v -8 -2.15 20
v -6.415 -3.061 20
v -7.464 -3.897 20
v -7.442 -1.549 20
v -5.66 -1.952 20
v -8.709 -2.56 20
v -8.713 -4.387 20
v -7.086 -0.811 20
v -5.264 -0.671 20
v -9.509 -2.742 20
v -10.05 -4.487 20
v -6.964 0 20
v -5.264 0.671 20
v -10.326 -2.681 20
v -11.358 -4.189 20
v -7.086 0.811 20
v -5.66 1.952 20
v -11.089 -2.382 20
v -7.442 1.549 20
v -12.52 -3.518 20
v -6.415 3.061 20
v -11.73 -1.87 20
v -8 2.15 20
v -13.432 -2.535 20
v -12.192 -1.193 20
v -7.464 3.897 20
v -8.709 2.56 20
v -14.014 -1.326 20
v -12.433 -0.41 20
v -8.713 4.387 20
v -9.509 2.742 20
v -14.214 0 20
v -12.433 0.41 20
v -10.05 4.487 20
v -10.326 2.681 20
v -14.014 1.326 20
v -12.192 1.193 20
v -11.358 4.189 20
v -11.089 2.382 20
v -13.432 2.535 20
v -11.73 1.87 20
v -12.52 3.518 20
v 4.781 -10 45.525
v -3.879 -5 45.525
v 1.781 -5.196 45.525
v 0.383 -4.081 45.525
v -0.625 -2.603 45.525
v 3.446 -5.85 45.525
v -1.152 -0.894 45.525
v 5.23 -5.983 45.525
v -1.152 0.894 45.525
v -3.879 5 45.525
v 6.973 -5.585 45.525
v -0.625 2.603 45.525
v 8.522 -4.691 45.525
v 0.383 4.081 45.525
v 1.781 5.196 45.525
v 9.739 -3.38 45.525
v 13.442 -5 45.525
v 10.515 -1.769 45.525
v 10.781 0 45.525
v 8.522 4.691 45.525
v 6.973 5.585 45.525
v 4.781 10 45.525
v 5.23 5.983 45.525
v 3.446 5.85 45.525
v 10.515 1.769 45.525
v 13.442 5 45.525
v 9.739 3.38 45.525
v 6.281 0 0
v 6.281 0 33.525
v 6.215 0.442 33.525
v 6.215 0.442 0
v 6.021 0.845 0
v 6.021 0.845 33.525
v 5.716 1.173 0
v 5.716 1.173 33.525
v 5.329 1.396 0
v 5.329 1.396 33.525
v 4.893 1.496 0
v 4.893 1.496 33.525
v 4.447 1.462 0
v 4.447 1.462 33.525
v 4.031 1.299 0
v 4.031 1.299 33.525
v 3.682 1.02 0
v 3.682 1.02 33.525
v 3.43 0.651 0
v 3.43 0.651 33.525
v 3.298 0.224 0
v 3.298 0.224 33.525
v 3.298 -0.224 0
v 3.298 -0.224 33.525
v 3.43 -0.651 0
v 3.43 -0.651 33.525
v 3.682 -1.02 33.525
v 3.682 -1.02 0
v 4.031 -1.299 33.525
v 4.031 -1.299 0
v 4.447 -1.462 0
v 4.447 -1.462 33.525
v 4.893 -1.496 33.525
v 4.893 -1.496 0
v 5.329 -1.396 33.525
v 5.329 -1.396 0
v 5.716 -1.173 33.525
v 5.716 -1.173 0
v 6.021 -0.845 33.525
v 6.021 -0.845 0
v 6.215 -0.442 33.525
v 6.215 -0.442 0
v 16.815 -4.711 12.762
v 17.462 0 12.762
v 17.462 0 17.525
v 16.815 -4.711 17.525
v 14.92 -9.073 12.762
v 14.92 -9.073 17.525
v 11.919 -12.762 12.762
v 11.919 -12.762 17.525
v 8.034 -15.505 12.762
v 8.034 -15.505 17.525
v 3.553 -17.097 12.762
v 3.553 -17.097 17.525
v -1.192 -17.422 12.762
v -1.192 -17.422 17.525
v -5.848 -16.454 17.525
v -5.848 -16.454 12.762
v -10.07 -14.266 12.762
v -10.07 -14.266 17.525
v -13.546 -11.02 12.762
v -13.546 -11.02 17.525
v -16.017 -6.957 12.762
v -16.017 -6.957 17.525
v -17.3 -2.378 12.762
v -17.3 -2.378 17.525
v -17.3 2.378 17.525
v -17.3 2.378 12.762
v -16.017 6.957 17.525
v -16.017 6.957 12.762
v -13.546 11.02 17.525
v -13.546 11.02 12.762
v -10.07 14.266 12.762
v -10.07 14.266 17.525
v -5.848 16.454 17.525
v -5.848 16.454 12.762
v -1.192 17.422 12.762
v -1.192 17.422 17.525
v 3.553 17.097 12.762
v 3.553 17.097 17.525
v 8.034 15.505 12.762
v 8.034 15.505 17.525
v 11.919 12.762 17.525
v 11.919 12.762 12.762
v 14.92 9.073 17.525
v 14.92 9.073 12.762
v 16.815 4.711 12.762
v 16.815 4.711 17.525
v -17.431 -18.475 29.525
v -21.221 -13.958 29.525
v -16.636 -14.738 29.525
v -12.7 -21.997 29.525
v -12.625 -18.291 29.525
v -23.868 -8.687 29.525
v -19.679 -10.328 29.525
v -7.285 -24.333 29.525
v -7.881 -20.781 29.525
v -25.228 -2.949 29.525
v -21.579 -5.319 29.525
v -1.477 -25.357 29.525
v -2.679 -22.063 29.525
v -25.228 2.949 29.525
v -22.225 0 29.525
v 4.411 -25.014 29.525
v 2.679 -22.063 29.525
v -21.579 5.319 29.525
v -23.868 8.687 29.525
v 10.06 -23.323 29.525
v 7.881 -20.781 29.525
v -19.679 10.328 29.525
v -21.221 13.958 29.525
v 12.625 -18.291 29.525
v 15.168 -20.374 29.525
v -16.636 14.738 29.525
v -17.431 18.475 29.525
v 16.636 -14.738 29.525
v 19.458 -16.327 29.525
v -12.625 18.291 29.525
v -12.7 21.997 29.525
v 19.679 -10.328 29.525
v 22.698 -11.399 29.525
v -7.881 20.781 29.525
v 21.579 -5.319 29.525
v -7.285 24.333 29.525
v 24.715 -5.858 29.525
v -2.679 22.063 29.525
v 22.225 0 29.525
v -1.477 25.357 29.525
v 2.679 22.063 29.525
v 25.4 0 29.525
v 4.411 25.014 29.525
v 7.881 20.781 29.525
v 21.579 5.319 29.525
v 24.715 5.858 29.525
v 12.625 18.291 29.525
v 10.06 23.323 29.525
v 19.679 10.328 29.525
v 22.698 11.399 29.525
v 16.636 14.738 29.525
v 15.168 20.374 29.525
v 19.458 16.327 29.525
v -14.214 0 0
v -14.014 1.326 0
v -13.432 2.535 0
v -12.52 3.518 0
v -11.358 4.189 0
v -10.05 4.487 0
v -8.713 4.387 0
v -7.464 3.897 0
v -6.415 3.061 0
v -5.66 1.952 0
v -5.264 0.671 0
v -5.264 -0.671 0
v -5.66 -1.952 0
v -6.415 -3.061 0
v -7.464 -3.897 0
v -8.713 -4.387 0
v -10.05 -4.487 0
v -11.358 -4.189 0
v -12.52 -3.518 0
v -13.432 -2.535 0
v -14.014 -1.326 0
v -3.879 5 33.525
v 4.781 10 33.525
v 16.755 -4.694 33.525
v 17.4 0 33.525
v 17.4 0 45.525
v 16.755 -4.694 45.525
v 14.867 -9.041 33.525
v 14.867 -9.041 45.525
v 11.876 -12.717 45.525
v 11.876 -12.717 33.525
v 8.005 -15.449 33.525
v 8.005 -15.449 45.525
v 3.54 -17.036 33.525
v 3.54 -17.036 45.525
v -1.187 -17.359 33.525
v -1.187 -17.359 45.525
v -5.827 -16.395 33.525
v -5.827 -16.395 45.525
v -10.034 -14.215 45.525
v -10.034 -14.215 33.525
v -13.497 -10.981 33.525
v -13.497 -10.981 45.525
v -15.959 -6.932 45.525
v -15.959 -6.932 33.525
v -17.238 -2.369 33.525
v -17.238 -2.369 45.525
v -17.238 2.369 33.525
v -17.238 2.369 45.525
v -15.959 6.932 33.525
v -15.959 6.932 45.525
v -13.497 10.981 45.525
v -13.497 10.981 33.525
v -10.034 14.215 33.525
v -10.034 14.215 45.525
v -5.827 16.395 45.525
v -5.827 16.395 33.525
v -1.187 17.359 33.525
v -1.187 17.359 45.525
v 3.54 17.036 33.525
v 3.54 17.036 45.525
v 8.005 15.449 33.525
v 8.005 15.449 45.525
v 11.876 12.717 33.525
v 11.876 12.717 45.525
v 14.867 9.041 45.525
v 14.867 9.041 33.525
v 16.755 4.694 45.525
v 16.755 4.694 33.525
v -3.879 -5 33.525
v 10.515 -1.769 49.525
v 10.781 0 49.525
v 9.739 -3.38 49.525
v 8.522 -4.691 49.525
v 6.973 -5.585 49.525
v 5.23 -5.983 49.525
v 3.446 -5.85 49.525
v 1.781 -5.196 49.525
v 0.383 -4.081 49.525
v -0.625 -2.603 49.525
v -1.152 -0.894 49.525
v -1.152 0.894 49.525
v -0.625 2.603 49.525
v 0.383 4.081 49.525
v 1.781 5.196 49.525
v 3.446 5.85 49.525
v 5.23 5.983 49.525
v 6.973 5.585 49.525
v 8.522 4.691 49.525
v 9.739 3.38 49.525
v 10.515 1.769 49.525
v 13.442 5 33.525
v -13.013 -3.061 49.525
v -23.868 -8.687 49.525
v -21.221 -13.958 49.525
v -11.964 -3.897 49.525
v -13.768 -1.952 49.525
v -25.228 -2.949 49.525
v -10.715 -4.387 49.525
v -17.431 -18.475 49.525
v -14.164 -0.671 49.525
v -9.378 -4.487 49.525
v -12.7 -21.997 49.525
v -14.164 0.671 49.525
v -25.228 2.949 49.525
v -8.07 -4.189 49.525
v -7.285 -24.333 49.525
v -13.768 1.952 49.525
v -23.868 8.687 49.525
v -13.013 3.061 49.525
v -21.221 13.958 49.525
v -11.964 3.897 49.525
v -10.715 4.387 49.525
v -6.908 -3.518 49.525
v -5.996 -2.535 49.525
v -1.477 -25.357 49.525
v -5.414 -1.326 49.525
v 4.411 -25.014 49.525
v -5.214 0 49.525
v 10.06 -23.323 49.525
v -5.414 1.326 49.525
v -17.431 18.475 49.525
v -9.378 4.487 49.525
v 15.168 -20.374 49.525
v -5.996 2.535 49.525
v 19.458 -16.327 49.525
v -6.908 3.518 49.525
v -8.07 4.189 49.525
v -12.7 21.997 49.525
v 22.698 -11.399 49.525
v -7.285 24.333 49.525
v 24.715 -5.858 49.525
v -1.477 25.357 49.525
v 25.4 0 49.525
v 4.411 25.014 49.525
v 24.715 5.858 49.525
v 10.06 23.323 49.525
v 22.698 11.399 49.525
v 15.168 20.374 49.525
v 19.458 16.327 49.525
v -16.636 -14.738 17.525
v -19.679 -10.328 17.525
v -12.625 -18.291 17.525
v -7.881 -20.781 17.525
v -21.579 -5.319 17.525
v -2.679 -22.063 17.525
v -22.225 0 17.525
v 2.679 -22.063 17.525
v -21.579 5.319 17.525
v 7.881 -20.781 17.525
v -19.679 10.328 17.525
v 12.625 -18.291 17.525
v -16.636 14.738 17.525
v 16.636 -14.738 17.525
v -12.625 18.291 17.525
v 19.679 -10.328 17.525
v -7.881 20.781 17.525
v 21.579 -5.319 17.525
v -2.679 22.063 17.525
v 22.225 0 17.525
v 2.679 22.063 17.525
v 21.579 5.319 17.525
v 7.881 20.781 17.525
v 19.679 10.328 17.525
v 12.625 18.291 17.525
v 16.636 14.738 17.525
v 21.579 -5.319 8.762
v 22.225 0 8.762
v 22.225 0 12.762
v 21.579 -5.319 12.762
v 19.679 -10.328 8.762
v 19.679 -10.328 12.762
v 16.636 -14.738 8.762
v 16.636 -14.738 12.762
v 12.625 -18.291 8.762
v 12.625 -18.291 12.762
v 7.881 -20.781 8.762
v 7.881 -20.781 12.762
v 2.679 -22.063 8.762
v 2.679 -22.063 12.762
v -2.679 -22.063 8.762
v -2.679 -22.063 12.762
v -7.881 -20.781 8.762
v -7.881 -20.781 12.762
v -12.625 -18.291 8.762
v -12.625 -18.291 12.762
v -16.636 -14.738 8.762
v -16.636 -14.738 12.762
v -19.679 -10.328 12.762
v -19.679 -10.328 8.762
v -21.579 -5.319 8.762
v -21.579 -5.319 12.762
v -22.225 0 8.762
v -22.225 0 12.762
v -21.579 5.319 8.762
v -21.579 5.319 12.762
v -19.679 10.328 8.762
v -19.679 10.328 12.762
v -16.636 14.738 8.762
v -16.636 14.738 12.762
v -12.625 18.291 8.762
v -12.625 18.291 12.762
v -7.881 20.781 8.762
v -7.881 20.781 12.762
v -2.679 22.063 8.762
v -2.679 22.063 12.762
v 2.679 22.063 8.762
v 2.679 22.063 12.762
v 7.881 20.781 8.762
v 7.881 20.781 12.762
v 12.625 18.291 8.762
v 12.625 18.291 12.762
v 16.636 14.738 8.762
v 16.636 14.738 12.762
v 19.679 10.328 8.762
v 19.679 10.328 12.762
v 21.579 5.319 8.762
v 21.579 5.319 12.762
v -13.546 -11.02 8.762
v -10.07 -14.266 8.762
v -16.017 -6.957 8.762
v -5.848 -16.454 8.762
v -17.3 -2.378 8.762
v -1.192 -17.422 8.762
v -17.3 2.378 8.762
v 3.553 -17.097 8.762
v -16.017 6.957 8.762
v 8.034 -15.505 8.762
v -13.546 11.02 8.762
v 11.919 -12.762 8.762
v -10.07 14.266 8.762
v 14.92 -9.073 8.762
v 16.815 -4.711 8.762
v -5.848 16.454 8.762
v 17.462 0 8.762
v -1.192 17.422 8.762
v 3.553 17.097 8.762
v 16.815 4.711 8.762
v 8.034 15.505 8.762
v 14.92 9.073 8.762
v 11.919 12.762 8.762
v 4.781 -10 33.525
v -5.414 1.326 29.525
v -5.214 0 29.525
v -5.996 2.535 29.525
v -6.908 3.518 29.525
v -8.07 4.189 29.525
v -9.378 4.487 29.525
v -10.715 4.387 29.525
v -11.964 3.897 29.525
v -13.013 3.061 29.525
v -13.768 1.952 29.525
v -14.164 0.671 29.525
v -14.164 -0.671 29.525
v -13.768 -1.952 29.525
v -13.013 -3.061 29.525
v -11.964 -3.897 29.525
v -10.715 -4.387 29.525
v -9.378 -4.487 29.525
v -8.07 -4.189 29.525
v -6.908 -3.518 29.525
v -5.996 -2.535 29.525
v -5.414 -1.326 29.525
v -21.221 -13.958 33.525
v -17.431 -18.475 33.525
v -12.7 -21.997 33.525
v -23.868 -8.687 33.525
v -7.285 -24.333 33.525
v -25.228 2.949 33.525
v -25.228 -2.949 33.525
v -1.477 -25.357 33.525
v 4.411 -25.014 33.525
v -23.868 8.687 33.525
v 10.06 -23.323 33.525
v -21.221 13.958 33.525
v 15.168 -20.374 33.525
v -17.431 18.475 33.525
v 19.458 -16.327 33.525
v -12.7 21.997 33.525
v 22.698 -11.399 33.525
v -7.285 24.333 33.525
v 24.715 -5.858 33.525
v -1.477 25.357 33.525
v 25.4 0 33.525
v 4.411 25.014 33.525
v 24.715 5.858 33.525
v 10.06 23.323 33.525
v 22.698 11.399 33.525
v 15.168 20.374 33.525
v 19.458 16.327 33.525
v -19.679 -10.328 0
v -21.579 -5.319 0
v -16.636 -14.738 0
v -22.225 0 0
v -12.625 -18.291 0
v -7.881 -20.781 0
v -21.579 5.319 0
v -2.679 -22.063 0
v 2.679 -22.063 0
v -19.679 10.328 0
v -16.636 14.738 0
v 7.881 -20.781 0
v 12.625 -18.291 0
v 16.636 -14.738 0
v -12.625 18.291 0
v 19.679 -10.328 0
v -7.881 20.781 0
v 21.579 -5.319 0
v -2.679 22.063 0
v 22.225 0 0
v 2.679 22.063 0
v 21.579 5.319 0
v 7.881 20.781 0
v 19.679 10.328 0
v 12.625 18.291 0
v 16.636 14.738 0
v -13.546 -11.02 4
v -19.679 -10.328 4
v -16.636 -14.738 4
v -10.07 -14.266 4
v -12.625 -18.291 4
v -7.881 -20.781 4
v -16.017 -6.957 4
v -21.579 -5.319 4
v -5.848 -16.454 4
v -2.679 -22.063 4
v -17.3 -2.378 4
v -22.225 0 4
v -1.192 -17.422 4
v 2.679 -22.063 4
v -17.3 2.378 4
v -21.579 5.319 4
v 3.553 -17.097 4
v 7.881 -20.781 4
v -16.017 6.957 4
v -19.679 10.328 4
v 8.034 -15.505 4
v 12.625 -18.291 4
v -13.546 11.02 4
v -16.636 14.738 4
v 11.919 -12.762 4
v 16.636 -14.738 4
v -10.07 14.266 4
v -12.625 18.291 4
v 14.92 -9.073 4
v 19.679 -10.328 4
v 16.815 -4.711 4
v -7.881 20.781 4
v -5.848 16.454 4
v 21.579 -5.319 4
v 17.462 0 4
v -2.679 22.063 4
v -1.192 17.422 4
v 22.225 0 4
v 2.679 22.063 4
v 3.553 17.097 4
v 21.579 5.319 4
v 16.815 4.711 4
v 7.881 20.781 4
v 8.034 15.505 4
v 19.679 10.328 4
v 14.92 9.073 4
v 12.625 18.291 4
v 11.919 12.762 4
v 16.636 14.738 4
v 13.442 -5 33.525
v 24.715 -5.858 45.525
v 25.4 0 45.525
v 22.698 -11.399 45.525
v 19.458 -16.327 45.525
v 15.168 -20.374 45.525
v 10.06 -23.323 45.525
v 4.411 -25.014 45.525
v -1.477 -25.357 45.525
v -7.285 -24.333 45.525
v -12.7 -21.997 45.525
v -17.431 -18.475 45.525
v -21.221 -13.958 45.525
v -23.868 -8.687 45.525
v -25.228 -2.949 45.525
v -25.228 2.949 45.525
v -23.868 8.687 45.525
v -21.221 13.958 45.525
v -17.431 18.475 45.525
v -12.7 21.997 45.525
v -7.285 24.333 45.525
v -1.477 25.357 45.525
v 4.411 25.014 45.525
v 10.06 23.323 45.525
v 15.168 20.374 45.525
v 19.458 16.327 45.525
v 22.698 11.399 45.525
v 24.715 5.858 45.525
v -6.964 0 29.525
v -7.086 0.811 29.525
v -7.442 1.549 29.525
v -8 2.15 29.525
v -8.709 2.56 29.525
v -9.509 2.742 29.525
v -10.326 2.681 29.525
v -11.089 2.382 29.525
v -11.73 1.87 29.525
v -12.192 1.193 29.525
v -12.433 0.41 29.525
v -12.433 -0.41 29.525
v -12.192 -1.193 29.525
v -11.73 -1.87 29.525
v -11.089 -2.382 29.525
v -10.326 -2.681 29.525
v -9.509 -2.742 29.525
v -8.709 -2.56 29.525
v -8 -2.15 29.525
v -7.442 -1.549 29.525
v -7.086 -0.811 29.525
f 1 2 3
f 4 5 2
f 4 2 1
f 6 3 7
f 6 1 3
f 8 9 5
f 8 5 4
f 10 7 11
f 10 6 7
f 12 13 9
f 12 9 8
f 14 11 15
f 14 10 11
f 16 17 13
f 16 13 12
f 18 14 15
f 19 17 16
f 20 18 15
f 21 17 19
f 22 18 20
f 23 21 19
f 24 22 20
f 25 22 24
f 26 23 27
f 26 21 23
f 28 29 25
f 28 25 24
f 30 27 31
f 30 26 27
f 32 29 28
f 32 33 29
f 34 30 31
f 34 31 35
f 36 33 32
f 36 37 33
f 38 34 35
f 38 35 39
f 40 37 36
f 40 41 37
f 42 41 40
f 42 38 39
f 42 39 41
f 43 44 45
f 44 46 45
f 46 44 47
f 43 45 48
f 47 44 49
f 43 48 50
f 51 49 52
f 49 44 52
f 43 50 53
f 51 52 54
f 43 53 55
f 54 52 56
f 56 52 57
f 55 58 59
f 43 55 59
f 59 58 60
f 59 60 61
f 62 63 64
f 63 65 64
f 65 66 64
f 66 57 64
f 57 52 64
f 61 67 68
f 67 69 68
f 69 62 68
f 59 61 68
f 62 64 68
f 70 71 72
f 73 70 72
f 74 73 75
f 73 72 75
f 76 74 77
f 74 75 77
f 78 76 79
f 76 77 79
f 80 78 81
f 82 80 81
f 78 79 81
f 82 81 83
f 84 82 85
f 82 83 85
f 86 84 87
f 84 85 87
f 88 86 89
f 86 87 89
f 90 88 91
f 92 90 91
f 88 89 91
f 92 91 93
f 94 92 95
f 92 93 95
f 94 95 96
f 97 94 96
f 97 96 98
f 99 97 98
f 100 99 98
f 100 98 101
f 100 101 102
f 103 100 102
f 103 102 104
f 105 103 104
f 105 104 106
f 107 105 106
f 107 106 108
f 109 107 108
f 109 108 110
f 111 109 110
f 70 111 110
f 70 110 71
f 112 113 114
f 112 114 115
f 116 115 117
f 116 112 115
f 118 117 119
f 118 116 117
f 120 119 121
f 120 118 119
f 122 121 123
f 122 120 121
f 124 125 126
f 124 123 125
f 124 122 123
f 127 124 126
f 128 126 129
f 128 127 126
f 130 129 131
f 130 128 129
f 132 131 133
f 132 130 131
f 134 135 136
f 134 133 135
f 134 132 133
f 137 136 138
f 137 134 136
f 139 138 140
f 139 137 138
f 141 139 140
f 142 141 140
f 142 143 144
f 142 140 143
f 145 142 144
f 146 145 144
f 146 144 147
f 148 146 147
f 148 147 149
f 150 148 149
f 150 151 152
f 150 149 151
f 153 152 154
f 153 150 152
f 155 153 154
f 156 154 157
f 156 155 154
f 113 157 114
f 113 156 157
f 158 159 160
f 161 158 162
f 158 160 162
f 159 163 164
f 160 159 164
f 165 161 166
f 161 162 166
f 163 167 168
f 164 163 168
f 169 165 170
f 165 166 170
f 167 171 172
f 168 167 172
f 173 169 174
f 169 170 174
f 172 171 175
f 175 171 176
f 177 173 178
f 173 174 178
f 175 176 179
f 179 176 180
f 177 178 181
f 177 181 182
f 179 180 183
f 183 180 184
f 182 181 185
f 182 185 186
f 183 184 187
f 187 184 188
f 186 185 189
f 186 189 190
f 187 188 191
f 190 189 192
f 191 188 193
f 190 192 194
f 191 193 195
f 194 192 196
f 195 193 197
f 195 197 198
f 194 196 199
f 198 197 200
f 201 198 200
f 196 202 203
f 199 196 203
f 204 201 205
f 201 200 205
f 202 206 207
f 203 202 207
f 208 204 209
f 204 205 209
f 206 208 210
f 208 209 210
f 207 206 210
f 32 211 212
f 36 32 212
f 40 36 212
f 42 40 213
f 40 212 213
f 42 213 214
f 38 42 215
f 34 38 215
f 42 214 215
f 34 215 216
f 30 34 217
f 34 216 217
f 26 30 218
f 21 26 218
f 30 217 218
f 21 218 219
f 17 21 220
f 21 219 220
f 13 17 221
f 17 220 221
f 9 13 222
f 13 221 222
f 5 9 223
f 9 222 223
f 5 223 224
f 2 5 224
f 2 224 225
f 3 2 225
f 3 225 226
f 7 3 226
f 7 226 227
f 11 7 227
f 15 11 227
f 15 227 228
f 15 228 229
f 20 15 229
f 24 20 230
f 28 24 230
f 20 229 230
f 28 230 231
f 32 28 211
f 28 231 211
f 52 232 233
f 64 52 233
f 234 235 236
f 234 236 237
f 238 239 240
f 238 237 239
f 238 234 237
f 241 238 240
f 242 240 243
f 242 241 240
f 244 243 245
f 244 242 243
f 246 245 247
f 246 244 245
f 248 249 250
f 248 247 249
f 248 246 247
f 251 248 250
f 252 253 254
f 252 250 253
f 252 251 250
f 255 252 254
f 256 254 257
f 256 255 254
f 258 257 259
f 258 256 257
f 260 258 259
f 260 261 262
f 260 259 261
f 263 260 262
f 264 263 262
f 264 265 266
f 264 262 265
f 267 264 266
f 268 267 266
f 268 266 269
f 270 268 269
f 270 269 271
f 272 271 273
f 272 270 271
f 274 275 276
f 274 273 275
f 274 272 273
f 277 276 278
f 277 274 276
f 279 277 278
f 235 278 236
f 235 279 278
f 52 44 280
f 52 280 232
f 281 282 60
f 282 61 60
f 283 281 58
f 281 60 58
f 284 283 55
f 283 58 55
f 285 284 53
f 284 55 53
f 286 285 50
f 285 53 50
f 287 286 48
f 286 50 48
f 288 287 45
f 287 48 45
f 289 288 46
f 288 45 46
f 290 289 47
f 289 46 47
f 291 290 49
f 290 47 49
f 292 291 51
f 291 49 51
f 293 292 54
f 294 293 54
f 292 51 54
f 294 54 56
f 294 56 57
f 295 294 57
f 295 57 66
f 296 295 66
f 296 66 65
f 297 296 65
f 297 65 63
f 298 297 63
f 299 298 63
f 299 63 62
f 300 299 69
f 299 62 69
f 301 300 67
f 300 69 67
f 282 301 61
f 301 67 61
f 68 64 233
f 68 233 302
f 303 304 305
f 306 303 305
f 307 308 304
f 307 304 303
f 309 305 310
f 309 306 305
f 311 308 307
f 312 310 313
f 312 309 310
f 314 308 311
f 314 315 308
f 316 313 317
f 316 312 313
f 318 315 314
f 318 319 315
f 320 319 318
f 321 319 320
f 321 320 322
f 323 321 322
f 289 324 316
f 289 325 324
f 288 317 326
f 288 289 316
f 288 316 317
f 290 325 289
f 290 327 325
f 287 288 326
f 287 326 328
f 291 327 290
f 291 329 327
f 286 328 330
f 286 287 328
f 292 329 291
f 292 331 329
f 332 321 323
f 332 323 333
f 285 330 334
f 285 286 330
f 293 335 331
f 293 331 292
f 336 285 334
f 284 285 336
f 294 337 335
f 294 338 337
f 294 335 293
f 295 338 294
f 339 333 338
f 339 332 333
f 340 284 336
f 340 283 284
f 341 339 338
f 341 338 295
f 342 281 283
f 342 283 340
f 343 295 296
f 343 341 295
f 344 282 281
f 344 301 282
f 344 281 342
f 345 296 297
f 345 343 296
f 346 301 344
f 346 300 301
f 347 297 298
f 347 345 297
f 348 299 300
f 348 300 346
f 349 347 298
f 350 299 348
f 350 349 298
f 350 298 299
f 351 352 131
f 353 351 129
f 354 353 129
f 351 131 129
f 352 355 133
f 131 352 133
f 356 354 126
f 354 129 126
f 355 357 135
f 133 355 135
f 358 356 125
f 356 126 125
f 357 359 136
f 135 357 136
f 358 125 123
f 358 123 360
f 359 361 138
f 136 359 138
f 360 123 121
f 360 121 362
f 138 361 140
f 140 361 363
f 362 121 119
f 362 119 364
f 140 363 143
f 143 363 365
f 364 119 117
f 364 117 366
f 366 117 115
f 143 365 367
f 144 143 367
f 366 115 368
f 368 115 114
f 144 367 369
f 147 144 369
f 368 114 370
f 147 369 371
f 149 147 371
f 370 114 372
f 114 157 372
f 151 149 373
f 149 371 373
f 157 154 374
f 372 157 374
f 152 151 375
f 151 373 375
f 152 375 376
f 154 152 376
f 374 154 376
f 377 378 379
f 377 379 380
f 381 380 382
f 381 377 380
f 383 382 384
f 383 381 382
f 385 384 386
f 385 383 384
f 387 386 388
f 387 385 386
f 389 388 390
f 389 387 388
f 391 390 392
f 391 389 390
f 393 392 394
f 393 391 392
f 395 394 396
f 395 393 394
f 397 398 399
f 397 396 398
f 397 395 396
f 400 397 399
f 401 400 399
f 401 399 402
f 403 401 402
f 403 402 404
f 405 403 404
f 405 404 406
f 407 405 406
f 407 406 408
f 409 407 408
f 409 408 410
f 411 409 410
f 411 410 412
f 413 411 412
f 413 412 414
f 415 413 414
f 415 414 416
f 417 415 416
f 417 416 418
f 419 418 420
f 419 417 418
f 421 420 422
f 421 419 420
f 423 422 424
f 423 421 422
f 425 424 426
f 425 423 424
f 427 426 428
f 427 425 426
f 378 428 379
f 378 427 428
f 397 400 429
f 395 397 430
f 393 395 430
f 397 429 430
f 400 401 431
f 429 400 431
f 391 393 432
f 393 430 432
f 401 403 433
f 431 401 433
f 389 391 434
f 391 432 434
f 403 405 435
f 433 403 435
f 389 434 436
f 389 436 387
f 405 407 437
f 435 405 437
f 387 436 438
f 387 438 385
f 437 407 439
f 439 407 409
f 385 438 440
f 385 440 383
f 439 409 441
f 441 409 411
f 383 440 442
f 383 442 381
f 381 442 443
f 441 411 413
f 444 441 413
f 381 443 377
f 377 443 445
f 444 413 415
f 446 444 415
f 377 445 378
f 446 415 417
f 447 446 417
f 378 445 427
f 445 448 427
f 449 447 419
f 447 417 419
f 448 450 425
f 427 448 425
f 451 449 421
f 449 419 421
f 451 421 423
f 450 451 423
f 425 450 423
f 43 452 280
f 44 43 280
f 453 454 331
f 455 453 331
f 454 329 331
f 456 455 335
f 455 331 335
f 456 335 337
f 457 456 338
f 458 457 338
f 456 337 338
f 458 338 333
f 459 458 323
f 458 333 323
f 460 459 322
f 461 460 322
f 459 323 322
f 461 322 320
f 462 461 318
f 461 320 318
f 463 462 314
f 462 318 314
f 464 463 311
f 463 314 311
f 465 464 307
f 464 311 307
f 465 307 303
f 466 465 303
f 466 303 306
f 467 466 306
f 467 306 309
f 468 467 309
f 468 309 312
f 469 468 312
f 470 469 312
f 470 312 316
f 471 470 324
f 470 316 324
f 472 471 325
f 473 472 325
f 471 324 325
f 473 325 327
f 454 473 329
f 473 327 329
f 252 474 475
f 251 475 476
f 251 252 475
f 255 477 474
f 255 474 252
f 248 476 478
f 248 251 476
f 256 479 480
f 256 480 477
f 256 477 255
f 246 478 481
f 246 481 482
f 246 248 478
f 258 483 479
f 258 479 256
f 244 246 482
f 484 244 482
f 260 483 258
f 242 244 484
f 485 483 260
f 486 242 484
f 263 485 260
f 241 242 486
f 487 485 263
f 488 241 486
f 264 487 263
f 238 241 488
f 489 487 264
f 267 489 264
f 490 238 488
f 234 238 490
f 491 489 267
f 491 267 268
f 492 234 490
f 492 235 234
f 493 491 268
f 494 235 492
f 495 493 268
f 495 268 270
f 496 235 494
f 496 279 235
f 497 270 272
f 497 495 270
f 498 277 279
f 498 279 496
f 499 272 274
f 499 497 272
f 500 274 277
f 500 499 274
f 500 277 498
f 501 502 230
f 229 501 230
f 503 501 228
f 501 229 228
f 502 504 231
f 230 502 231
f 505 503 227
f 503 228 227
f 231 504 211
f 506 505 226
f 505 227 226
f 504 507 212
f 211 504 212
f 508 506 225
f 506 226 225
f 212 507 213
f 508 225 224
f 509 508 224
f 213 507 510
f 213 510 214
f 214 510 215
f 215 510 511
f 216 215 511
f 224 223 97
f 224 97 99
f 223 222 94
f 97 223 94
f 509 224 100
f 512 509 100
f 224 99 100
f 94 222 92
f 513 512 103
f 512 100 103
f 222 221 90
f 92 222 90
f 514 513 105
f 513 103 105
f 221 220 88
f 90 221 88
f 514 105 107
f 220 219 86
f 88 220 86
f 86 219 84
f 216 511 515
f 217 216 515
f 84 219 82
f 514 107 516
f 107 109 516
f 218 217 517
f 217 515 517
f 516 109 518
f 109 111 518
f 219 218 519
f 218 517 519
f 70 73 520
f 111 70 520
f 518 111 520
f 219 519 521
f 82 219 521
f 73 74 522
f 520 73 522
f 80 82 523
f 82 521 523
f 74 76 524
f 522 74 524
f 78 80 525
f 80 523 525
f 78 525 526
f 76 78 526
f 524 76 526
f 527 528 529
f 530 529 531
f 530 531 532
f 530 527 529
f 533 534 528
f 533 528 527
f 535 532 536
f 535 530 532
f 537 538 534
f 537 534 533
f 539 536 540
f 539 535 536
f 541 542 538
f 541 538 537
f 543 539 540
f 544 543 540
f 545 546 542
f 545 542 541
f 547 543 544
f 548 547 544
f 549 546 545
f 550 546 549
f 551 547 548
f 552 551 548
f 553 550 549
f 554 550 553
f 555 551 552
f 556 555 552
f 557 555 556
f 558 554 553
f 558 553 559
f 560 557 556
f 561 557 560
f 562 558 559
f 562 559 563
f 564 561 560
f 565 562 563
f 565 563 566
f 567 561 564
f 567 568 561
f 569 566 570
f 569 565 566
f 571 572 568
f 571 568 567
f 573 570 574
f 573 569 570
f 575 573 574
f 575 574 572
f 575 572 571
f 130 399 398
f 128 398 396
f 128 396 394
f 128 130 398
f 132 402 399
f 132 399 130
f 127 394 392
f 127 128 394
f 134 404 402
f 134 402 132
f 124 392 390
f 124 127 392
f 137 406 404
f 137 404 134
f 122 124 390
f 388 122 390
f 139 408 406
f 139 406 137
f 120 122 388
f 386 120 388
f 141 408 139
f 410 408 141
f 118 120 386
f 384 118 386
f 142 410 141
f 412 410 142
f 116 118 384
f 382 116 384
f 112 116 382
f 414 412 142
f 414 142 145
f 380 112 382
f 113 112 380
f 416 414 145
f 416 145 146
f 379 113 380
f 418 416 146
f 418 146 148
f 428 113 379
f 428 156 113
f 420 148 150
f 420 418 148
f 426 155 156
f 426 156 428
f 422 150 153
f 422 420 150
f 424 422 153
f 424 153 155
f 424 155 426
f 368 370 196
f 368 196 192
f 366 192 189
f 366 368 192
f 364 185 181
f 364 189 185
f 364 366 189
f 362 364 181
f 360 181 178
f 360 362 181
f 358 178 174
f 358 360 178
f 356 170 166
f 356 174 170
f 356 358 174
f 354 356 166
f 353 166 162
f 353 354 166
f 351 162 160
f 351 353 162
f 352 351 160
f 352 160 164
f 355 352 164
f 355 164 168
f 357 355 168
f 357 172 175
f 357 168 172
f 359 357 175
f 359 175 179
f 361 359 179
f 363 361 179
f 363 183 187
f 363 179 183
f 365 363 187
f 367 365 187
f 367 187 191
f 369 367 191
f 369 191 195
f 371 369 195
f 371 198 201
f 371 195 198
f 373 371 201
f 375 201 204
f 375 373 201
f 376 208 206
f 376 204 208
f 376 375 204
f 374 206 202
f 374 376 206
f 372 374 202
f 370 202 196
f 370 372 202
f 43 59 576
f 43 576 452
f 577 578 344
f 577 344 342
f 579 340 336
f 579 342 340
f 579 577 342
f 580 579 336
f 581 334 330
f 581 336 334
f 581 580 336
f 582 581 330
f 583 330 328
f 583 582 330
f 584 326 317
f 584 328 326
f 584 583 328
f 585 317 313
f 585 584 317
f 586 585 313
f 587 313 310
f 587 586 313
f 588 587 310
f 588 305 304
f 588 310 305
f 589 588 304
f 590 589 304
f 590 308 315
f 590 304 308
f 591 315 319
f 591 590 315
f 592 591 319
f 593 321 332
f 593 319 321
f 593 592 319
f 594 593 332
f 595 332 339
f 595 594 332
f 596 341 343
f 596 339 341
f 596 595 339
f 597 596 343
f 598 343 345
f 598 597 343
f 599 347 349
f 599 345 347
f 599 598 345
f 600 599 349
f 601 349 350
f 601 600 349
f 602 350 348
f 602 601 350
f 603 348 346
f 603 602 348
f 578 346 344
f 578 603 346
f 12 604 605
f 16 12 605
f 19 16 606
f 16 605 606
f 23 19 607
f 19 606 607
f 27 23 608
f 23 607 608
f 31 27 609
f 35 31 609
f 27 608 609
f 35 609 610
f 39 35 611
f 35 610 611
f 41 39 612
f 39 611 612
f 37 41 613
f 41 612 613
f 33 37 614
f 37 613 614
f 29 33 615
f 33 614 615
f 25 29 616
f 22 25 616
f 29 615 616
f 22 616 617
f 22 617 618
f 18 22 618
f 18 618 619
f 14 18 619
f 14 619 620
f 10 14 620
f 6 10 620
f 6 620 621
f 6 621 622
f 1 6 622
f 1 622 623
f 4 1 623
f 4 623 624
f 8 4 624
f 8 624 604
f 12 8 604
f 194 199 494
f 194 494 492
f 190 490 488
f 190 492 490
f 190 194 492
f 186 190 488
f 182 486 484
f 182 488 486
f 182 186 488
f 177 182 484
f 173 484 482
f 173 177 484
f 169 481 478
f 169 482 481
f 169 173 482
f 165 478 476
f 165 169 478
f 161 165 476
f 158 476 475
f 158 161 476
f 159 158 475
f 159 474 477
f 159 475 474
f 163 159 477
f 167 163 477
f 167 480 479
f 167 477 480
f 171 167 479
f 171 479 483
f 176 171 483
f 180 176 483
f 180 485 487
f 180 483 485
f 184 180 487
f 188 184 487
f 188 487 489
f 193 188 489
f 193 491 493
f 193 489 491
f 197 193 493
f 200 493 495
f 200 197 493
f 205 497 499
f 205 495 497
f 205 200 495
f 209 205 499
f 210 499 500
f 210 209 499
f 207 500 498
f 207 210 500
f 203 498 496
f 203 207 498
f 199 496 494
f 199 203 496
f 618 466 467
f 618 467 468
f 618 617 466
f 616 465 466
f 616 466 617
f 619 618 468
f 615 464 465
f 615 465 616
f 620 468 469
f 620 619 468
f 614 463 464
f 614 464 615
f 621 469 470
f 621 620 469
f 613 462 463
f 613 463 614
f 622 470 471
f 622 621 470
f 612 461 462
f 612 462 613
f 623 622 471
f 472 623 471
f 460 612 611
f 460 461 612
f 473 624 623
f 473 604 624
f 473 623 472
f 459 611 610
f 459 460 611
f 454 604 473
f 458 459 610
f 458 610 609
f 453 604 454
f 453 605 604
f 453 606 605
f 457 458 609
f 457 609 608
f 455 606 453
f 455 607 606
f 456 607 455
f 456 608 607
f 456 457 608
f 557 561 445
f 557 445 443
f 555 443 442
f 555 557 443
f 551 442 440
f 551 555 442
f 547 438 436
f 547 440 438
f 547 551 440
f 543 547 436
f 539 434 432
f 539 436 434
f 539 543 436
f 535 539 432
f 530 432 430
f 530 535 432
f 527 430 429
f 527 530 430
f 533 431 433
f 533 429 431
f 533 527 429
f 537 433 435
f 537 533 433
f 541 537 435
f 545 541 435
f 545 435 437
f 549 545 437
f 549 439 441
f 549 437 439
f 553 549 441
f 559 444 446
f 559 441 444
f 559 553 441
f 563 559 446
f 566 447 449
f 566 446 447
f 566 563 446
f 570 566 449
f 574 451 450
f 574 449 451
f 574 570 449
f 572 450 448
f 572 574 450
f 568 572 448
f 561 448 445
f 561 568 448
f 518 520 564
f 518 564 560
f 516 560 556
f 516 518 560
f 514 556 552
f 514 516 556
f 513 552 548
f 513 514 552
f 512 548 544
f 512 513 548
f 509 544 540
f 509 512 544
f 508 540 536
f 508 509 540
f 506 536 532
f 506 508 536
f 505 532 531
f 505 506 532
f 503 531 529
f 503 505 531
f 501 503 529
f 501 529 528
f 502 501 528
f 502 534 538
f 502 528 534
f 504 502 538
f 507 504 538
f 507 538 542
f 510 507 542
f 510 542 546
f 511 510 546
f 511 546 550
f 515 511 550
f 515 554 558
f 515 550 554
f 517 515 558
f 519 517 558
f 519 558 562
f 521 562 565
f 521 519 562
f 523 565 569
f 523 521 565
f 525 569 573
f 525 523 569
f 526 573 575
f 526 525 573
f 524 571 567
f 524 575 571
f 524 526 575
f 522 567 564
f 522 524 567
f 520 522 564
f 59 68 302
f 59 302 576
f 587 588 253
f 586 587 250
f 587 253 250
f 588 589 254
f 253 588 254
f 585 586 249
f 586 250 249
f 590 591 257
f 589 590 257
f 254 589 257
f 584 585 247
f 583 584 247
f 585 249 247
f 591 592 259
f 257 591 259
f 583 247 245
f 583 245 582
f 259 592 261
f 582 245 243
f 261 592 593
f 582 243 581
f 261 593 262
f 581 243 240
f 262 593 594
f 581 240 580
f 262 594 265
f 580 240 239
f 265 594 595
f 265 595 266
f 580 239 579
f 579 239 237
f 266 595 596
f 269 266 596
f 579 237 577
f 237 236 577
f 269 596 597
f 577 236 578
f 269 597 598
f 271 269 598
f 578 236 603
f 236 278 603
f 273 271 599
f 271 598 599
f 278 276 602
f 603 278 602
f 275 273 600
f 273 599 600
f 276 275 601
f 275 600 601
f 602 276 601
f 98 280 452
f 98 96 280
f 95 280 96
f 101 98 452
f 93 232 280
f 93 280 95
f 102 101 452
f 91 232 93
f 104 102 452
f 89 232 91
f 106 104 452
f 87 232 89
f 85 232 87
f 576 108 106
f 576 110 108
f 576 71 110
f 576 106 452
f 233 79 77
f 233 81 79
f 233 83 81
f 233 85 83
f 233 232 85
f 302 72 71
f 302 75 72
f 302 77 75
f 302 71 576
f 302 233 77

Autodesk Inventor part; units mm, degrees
ref_plane "YZ Plane" through (0, 0, 0) normal (1, 0, 0) x (0, 1, 0)
ref_plane "XZ Plane" through (0, 0, 0) normal (0, 1, 0) x (-1, 0, 0)
ref_plane "XY Plane" through (0, 0, 0) normal (0, 0, 1) x (1, 0, 0)
sketch "Sketch2" plane through (0, 0, 0) normal (0, 0, 1) x (1, 0, 0)
  circle A0 centre (0, 0) radius 22.225
  dimension "d4" = 44.45
extrude "Extrusion2" add sketch "Sketch2" along normal blind 4
sketch "Sketch3" plane through (0, 0, 4) normal (0, 0, 1) x (1, 0, 0)
  circle A0 centre (0, 0) radius 22.225 projected
  circle A1 centre (0, 0) radius 17.4625
  dimension "d7" = 34.925
extrude "Extrusion3" add sketch "Sketch3" along normal blind 4.7625 contours A1
sketch "Sketch4" plane through (0, 0, 8.7625) normal (0, 0, 1) x (1, 0, 0)
  circle A0 centre (0, 0) radius 17.4625 projected
  circle A1 centre (0, 0) radius 22.225
  dimension "d10" = 44.45
extrude "Extrusion4" add sketch "Sketch4" along normal blind 4 contours A0 | A1
sketch "Sketch5" plane through (0, 0, 12.7625) normal (0, 0, 1) x (1, 0, 0)
  circle A0 centre (0, 0) radius 22.225 projected
  circle A1 centre (0, 0) radius 17.4625
  dimension "d13" = 34.925
extrude "Extrusion5" add sketch "Sketch5" along normal blind 4.7625 contours A1
sketch "Sketch6" plane through (0, 0, 17.525) normal (0, 0, 1) x (1, 0, 0)
  circle A0 centre (0, 0) radius 17.4625 projected
  circle A1 centre (0, 0) radius 22.225
  dimension "d16" = 44.45
extrude "Extrusion6" add sketch "Sketch6" along normal blind 12 contours A0 | A1
sketch "Sketch7" plane through (0, 0, 29.525) normal (0, 0, 1) x (1, 0, 0)
  circle A0 centre (0, 0) radius 22.225 projected
  circle A1 centre (0, 0) radius 25.4
  dimension "d19" = 50.8
extrude "Extrusion7" add sketch "Sketch7" along normal blind 4 contours A0 | A1
sketch "Sketch8" plane through (0, 0, 33.525) normal (0, 0, 1) x (1, 0, 0)
  circle A0 centre (0, 0) radius 25.4 projected
  circle A1 centre (0, 0) radius 17.4
  dimension "d22" = 34.8
extrude "Extrusion8" add sketch "Sketch8" along normal blind 12 contours A1
sketch "Sketch Main" plane through (0, 0, 45.525) normal (0, 0, 1) x (1, 0, 0)
  circle A0 centre (0, 0) radius 17.4 projected
  circle A1 centre (0, 0) radius 25.4
  line L0 (-17.4, 0) -> (17.4, 0) construction
  circle A2 centre (-9.7141, 0) radius 2.75
  circle A3 centre (-9.7141, 0) radius 4.5
  circle A4 centre (4.7812, 0) radius 6
  circle A5 centre (4.7812, 0) radius 9 construction
  circle A6 centre (4.7812, 0) radius 10 construction
  line L1 (13.4415, 5) -> (13.4415, -5)
  line L2 (13.4415, -5) -> (4.7812, -10)
  line L3 (4.7812, -10) -> (-3.879, -5)
  line L4 (-3.879, -5) -> (-3.879, 5)
  line L5 (-3.879, 5) -> (4.7812, 10)
  line L6 (4.7812, 10) -> (13.4415, 5)
  circle A7 centre (4.7812, 0) radius 1.5
  dimension "d51" = 20
  dimension "d25" = 50.8
  dimension "d39" = 5.5
  dimension "d40" = 9
  dimension "d41" = 12
  dimension "d42" = 18
  dimension "d56" = 3
extrude "Extrusion9" add sketch "Sketch Main" along normal blind 4 contours A0 | A1 | A2 | A3 | A4 | L1 L2 L3 L4 L5 L6 | A7
extrude "Extrusion13" cut sketch "Sketch Main" along normal blind 4 and the other way blind 16 contours A2 | A3
extrude "Extrusion14" cut sketch "Sketch Main" against normal through all contours A2
extrude "Extrusion15" cut sketch "Sketch Main" against normal blind 12 contours A4 | L1 L2 L3 L4 L5 L6 | A7
extrude "Extrusion16" cut sketch "Sketch Main" along normal through all contours A4 | A7
extrude "Extrusion17" cut sketch "Sketch Main" against normal through all contours A7
sketch "Sketch11" plane through (0, 0, 0) normal (0, 0, -1) x (-1, 0, 0)
  circle A0 centre (9.7141, 0) radius 2.75 projected
  circle A1 centre (9.7141, 0) radius 4.5
  dimension "d59" = 9
extrude "Extrusion18" cut sketch "Sketch11" against normal blind 20 contours A0 | A1
properties part number "battery_cap"
